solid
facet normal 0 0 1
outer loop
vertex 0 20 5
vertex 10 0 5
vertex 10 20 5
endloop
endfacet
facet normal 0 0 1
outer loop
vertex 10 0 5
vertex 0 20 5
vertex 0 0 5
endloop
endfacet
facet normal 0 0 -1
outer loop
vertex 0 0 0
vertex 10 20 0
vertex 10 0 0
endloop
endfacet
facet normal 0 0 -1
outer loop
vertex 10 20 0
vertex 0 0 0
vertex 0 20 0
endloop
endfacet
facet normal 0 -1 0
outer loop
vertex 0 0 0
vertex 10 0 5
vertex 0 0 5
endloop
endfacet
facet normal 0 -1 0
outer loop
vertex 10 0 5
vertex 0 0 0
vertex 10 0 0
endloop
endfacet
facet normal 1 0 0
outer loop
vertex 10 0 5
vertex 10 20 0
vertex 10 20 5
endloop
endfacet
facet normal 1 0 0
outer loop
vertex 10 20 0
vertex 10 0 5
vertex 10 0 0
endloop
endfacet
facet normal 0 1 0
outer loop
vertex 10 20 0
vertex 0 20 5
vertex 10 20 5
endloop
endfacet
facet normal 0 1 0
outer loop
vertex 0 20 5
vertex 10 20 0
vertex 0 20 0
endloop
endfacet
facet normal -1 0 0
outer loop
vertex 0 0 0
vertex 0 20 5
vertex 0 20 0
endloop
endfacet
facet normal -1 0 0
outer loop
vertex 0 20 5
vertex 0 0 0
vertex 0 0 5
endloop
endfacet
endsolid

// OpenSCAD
// Generated by generate_scads.py
cube(size=[10,20,5], center=false);
